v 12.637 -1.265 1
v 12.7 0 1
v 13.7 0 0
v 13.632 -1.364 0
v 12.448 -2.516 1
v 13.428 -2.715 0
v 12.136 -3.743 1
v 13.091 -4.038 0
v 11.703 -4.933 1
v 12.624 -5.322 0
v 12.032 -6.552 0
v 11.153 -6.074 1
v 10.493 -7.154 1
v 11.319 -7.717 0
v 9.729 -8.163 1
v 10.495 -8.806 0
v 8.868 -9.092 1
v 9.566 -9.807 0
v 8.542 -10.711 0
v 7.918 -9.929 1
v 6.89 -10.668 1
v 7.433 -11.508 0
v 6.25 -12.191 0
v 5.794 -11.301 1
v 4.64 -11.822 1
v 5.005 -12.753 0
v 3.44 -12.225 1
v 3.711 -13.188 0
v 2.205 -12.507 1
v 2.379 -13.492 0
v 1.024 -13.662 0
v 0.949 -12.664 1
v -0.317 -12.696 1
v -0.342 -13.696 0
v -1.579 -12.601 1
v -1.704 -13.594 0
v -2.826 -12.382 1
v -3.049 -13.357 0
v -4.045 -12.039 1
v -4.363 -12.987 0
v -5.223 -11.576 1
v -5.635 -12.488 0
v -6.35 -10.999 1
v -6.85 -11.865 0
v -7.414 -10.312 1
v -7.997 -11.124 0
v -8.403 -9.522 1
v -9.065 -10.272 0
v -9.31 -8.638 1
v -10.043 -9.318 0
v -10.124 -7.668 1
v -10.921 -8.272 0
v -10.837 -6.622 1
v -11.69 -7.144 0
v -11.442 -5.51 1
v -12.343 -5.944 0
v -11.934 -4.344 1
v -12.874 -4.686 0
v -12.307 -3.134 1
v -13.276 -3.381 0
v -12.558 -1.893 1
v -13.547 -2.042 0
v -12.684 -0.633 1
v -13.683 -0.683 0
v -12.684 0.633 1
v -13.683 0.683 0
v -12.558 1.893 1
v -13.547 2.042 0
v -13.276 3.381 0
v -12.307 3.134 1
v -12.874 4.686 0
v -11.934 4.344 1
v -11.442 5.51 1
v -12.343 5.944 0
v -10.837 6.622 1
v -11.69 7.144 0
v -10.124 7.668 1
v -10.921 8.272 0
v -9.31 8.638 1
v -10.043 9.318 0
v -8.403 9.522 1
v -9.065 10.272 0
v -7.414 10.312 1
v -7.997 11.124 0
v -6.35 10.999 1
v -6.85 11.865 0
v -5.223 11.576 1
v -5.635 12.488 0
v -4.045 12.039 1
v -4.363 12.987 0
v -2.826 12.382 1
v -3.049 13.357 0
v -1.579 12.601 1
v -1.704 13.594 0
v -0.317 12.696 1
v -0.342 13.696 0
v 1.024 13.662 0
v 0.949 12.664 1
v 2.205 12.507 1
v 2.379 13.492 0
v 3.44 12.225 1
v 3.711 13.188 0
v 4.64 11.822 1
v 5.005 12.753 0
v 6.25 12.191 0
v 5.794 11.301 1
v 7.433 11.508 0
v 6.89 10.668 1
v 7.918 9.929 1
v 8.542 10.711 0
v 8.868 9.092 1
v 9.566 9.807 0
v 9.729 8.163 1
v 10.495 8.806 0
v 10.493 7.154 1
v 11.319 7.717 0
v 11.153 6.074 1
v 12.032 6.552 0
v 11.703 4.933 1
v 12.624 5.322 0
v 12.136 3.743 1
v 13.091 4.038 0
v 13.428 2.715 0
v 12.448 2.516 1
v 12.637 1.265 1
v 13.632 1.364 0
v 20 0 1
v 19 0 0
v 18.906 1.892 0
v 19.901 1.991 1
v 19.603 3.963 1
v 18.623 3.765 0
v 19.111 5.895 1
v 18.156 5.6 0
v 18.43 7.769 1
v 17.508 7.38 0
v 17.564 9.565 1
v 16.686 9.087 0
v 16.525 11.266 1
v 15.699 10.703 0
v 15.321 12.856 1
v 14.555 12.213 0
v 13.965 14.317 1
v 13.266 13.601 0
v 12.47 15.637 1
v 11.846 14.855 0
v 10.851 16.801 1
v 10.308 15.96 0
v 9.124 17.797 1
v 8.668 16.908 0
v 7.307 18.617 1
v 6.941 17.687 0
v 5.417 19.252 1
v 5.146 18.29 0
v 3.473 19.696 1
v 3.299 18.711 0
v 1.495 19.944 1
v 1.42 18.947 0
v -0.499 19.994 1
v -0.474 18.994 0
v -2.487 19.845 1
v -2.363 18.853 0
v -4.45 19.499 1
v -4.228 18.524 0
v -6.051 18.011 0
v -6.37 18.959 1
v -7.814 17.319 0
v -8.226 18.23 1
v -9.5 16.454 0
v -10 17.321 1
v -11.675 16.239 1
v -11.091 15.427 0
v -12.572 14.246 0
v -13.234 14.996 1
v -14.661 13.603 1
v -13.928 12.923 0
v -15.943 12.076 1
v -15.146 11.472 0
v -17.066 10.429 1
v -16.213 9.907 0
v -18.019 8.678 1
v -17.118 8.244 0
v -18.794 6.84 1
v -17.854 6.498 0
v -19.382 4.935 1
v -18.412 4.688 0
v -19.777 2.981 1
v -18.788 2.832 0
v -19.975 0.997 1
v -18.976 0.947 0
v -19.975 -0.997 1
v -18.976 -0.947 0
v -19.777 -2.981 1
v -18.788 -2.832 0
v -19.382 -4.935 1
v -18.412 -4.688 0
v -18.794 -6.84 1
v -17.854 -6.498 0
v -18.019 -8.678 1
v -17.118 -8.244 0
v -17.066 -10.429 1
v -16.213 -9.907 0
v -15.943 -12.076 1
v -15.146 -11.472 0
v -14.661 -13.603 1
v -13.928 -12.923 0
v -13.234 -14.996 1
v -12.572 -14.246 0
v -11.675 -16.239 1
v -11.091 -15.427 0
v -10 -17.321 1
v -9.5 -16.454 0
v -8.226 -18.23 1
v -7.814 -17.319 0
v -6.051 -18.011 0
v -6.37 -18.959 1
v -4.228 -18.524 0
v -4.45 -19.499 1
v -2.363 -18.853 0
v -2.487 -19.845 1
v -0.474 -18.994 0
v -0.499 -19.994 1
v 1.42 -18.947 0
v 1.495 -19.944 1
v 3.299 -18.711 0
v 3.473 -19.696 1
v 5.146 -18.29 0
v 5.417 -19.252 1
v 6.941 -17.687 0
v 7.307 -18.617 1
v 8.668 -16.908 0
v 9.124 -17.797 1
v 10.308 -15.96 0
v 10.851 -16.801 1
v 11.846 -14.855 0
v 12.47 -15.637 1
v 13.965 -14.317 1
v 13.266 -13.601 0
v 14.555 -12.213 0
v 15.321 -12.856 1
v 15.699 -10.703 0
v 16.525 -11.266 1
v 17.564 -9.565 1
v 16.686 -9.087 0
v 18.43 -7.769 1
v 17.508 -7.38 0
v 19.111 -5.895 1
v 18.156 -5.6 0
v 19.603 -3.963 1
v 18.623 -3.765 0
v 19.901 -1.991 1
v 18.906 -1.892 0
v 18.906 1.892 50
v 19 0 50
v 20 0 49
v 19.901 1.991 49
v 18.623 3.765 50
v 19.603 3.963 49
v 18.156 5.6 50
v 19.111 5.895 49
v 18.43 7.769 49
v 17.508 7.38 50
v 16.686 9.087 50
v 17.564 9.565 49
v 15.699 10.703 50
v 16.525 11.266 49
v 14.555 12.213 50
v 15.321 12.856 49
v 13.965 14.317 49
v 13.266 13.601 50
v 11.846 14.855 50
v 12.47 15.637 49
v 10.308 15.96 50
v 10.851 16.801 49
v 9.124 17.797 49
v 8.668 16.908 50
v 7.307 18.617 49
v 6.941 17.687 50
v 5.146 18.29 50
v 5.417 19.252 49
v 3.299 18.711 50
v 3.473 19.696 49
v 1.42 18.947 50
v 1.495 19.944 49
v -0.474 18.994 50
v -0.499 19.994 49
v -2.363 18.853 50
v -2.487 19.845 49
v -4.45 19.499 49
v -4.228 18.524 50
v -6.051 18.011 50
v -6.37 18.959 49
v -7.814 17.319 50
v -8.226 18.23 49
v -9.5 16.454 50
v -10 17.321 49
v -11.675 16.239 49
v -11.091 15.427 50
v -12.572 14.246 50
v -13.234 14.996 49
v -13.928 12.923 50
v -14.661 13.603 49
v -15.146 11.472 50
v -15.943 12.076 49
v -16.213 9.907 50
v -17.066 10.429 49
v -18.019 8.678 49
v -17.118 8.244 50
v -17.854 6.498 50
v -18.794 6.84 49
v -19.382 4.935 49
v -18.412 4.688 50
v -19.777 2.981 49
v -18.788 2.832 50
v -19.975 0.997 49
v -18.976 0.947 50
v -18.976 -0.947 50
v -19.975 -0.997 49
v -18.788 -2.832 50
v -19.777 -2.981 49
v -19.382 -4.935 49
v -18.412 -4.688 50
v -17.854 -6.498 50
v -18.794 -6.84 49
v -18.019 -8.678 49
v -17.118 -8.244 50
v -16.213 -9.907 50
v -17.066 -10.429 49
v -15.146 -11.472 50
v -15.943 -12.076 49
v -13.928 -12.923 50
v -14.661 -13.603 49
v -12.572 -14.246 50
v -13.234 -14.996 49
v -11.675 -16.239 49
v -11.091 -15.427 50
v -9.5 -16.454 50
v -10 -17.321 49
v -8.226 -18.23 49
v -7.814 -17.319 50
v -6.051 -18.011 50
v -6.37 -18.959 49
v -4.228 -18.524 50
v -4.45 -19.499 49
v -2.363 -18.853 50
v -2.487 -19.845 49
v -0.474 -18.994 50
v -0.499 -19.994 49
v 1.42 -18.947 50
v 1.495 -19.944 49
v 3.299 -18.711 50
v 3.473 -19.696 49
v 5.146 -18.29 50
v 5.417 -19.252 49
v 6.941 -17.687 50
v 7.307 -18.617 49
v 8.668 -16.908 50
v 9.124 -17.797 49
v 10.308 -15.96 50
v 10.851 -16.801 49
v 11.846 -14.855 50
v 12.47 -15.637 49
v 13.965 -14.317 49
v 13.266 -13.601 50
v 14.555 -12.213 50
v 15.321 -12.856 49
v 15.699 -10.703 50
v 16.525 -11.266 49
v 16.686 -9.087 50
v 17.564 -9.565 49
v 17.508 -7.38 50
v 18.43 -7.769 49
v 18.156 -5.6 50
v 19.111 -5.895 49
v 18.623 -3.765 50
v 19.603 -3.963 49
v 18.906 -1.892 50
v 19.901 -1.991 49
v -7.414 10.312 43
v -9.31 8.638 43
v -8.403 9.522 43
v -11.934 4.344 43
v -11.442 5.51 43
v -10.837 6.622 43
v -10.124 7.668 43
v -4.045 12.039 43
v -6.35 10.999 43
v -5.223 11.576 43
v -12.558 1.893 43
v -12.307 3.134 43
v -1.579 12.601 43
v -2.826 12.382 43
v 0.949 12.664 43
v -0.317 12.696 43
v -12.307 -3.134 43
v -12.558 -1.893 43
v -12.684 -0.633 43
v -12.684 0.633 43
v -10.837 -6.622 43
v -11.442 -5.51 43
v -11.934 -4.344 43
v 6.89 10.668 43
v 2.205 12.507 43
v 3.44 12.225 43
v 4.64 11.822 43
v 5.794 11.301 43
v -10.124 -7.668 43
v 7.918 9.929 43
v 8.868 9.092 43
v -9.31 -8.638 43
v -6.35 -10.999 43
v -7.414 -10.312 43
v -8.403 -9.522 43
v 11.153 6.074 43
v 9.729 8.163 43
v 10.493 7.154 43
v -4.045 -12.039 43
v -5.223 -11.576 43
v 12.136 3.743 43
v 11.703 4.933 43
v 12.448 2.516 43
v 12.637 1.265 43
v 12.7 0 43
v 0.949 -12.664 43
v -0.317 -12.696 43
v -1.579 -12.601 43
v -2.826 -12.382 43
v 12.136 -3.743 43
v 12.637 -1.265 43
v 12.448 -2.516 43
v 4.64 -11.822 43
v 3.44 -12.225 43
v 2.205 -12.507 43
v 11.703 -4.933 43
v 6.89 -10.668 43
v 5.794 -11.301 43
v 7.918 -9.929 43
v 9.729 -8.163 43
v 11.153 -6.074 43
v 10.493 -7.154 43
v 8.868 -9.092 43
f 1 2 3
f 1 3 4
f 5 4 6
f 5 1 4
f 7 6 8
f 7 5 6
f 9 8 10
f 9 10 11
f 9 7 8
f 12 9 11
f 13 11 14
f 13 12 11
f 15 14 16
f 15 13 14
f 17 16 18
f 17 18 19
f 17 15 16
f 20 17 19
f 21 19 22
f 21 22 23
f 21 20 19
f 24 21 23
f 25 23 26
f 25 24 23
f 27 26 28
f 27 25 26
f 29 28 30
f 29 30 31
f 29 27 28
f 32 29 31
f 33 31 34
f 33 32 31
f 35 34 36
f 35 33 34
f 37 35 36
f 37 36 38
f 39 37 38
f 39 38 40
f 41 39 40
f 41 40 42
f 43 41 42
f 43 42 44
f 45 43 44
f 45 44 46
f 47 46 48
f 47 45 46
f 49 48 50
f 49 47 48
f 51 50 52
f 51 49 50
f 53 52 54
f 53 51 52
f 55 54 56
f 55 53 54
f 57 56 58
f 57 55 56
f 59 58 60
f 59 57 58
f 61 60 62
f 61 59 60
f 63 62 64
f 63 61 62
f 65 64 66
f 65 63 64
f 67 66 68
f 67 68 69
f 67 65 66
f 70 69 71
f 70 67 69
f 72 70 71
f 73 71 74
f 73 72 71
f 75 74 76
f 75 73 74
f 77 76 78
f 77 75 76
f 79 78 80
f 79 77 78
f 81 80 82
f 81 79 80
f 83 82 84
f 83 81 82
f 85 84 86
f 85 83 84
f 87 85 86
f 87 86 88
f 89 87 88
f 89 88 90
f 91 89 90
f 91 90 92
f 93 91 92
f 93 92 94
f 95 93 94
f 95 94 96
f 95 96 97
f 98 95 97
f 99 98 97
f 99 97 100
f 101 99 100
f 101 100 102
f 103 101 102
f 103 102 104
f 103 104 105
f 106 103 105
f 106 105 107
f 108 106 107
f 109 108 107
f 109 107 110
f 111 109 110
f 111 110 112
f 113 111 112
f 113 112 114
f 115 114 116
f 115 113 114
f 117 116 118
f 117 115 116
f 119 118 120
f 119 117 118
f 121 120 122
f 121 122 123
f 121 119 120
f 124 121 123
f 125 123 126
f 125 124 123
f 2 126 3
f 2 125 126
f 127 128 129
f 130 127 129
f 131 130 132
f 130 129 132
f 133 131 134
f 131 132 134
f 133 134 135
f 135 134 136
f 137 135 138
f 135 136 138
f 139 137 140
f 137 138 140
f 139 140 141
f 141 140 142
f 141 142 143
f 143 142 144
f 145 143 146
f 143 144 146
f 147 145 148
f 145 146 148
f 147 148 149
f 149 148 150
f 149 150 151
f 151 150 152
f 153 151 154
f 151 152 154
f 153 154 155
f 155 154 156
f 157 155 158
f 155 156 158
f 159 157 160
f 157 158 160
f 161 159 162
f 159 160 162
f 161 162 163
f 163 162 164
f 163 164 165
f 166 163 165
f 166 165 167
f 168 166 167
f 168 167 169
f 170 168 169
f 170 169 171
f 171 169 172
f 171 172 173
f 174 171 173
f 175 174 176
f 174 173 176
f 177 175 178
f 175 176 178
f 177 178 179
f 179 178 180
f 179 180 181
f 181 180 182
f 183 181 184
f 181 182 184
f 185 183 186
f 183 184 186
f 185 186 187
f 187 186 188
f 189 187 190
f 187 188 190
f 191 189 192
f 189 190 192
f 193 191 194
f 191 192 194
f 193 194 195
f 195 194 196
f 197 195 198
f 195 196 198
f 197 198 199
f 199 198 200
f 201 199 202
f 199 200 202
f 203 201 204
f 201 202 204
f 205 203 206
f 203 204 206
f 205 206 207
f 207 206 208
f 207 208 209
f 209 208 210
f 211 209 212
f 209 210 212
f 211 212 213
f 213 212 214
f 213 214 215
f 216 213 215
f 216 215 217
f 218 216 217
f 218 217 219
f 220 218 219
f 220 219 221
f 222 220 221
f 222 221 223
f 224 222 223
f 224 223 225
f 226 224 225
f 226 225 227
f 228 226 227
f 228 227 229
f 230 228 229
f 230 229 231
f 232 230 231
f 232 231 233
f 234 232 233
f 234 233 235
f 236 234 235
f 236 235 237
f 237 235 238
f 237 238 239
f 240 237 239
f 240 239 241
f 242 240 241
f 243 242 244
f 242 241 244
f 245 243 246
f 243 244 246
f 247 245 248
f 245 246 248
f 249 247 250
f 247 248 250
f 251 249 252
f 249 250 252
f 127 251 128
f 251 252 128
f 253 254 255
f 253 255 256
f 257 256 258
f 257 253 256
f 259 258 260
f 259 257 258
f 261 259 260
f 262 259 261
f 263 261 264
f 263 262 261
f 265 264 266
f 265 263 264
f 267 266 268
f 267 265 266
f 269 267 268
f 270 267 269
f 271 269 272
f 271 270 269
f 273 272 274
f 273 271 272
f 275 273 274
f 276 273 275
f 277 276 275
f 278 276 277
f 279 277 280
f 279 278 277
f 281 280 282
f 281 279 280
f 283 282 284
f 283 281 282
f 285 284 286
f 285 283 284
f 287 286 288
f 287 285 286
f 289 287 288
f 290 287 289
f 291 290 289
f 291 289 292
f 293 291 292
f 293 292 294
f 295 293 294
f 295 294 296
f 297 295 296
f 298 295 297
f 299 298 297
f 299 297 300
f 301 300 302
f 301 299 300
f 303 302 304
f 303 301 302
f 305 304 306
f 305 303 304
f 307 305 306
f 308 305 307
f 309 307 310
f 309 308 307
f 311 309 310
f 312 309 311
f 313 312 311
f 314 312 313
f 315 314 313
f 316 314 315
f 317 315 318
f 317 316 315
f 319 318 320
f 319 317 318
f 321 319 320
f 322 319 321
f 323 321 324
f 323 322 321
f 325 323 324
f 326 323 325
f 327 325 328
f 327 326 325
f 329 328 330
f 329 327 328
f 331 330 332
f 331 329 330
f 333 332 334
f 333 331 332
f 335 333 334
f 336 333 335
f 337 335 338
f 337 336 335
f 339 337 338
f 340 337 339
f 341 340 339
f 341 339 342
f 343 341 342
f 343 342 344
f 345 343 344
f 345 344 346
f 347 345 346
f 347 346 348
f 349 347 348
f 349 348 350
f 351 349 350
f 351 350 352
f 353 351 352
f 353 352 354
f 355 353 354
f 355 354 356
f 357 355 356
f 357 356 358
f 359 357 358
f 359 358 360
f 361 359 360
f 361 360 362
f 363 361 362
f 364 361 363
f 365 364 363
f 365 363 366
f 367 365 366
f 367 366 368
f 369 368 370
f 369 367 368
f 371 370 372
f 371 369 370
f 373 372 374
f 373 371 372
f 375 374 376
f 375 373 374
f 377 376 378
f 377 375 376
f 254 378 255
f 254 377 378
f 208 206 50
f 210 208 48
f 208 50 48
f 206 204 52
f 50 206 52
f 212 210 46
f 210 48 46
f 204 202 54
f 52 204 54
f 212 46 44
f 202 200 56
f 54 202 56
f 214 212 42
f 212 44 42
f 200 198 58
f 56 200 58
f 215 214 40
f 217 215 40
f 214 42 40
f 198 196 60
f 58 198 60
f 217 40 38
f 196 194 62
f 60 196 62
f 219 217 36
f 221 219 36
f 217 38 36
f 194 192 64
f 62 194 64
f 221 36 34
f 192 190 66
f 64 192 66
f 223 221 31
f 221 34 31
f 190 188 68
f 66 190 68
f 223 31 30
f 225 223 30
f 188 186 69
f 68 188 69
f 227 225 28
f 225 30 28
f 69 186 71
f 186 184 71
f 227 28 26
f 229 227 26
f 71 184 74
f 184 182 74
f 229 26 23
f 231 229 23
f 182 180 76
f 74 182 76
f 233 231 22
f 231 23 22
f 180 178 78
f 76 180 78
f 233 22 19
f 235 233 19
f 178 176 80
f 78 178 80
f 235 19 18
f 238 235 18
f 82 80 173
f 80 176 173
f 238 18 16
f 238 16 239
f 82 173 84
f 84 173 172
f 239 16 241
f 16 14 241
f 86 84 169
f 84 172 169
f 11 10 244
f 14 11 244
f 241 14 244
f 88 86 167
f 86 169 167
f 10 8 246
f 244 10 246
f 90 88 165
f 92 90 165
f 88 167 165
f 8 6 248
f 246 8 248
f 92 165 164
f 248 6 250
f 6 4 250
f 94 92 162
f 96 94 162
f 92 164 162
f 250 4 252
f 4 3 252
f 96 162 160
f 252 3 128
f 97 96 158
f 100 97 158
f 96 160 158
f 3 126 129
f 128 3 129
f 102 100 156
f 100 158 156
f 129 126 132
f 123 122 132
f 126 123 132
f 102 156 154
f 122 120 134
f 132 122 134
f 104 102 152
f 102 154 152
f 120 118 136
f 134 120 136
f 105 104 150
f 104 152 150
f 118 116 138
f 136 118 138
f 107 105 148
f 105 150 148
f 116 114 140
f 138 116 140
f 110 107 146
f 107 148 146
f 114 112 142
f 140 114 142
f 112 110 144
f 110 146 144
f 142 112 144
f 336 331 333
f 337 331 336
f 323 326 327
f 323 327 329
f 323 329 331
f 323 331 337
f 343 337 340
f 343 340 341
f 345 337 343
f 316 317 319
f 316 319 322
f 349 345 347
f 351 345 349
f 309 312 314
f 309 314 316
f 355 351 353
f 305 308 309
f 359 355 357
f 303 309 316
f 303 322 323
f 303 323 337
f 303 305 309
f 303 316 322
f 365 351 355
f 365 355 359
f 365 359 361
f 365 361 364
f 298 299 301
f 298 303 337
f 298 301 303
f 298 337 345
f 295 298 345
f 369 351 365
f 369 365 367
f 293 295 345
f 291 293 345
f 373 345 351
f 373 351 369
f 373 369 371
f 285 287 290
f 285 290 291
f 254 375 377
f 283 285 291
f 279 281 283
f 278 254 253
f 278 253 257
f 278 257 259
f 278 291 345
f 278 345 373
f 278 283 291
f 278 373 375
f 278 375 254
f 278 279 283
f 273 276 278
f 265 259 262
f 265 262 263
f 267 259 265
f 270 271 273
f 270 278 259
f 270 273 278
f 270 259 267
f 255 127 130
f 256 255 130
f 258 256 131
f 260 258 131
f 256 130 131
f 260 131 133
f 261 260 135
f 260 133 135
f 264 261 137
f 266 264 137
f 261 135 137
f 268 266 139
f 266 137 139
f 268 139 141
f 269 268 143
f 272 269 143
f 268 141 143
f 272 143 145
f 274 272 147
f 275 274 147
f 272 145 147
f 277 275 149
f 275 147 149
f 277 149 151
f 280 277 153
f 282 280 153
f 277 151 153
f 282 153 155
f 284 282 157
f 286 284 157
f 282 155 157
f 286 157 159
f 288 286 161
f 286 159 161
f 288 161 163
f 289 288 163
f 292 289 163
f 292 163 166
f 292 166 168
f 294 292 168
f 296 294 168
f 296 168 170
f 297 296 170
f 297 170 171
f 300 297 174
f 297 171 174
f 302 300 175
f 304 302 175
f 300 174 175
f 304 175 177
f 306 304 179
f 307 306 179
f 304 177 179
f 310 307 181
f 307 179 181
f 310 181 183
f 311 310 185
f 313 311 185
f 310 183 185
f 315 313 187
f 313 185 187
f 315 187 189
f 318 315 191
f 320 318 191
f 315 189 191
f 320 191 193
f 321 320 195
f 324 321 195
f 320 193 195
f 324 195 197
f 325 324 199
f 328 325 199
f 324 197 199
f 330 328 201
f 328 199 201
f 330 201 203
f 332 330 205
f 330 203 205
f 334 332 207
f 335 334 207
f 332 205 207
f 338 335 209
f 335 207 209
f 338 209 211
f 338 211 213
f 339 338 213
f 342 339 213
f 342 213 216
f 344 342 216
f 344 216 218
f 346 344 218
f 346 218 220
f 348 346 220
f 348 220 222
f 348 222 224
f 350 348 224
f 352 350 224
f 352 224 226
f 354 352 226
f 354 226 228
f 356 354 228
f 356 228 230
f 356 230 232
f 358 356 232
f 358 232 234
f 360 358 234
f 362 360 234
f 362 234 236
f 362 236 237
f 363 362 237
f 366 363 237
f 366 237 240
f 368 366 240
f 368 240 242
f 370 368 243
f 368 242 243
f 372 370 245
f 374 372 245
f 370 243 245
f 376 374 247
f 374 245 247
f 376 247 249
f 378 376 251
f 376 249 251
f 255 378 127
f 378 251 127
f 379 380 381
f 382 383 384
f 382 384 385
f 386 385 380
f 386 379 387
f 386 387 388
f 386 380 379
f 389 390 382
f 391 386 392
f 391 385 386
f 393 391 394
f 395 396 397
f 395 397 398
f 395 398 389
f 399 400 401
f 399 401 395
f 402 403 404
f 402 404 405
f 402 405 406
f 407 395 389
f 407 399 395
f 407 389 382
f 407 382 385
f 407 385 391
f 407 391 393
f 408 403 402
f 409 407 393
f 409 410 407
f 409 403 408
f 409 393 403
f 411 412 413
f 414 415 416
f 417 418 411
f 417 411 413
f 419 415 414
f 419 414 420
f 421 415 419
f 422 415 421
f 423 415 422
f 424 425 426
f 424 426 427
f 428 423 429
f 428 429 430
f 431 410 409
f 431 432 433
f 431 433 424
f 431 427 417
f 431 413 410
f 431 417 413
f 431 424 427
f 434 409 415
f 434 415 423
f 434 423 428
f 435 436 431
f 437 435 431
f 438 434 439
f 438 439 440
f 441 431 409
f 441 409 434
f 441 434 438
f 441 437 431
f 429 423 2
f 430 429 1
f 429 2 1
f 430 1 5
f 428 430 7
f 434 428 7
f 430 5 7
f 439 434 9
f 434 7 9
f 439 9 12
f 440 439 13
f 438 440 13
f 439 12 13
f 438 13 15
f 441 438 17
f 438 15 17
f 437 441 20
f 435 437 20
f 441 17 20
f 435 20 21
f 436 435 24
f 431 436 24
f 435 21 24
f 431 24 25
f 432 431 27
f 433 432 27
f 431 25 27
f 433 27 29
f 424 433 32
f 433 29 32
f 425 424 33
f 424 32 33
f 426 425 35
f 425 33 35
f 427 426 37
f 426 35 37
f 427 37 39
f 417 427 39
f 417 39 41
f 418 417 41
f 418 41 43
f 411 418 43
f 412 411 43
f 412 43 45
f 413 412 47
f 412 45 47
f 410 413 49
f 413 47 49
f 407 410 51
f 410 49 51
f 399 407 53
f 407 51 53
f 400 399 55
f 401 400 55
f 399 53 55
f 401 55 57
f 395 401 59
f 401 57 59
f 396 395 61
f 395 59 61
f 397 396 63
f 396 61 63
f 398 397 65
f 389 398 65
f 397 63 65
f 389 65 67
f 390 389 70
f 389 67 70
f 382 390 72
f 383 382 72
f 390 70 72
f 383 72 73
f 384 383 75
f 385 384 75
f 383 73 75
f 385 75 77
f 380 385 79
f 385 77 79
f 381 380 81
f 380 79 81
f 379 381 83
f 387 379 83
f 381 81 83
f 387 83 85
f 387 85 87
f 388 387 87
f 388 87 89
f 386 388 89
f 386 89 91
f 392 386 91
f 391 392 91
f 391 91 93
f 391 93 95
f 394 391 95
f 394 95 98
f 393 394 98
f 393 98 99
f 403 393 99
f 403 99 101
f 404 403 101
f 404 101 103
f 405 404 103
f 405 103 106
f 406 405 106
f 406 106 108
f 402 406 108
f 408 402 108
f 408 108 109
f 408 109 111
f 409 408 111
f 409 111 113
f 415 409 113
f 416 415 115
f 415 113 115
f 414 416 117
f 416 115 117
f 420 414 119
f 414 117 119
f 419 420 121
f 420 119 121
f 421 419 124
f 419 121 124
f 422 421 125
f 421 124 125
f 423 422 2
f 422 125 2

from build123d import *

# Parameters (mm, degrees)
F0_R     = 20
F1_DEPTH = 50
F2_R     = 12.7
F3_DEPTH = 43
F4_SIZE  = 1


with BuildPart() as f1:
    # F0 (on Top) → F1 (new body)
    with BuildSketch(Plane.XY):
        Circle(F0_R)
    extrude(amount=F1_DEPTH)

    # F2 (on face) → F3 (cut)
    with BuildSketch(Plane(origin=(0, 0, 0), x_dir=(1, 0, 0), z_dir=(0, 0, -1))):
        Circle(F2_R)
    extrude(amount=-F3_DEPTH, mode=Mode.SUBTRACT)

    # F4
    f4_edges = [f1.edges().sort_by_distance(p)[0] for p in [
        (-12.7, 0, 0),
        (-20, 0, 0),
        (-20, 0, 50),
    ]]
    chamfer(f4_edges, length=F4_SIZE)


solid = f1.part
